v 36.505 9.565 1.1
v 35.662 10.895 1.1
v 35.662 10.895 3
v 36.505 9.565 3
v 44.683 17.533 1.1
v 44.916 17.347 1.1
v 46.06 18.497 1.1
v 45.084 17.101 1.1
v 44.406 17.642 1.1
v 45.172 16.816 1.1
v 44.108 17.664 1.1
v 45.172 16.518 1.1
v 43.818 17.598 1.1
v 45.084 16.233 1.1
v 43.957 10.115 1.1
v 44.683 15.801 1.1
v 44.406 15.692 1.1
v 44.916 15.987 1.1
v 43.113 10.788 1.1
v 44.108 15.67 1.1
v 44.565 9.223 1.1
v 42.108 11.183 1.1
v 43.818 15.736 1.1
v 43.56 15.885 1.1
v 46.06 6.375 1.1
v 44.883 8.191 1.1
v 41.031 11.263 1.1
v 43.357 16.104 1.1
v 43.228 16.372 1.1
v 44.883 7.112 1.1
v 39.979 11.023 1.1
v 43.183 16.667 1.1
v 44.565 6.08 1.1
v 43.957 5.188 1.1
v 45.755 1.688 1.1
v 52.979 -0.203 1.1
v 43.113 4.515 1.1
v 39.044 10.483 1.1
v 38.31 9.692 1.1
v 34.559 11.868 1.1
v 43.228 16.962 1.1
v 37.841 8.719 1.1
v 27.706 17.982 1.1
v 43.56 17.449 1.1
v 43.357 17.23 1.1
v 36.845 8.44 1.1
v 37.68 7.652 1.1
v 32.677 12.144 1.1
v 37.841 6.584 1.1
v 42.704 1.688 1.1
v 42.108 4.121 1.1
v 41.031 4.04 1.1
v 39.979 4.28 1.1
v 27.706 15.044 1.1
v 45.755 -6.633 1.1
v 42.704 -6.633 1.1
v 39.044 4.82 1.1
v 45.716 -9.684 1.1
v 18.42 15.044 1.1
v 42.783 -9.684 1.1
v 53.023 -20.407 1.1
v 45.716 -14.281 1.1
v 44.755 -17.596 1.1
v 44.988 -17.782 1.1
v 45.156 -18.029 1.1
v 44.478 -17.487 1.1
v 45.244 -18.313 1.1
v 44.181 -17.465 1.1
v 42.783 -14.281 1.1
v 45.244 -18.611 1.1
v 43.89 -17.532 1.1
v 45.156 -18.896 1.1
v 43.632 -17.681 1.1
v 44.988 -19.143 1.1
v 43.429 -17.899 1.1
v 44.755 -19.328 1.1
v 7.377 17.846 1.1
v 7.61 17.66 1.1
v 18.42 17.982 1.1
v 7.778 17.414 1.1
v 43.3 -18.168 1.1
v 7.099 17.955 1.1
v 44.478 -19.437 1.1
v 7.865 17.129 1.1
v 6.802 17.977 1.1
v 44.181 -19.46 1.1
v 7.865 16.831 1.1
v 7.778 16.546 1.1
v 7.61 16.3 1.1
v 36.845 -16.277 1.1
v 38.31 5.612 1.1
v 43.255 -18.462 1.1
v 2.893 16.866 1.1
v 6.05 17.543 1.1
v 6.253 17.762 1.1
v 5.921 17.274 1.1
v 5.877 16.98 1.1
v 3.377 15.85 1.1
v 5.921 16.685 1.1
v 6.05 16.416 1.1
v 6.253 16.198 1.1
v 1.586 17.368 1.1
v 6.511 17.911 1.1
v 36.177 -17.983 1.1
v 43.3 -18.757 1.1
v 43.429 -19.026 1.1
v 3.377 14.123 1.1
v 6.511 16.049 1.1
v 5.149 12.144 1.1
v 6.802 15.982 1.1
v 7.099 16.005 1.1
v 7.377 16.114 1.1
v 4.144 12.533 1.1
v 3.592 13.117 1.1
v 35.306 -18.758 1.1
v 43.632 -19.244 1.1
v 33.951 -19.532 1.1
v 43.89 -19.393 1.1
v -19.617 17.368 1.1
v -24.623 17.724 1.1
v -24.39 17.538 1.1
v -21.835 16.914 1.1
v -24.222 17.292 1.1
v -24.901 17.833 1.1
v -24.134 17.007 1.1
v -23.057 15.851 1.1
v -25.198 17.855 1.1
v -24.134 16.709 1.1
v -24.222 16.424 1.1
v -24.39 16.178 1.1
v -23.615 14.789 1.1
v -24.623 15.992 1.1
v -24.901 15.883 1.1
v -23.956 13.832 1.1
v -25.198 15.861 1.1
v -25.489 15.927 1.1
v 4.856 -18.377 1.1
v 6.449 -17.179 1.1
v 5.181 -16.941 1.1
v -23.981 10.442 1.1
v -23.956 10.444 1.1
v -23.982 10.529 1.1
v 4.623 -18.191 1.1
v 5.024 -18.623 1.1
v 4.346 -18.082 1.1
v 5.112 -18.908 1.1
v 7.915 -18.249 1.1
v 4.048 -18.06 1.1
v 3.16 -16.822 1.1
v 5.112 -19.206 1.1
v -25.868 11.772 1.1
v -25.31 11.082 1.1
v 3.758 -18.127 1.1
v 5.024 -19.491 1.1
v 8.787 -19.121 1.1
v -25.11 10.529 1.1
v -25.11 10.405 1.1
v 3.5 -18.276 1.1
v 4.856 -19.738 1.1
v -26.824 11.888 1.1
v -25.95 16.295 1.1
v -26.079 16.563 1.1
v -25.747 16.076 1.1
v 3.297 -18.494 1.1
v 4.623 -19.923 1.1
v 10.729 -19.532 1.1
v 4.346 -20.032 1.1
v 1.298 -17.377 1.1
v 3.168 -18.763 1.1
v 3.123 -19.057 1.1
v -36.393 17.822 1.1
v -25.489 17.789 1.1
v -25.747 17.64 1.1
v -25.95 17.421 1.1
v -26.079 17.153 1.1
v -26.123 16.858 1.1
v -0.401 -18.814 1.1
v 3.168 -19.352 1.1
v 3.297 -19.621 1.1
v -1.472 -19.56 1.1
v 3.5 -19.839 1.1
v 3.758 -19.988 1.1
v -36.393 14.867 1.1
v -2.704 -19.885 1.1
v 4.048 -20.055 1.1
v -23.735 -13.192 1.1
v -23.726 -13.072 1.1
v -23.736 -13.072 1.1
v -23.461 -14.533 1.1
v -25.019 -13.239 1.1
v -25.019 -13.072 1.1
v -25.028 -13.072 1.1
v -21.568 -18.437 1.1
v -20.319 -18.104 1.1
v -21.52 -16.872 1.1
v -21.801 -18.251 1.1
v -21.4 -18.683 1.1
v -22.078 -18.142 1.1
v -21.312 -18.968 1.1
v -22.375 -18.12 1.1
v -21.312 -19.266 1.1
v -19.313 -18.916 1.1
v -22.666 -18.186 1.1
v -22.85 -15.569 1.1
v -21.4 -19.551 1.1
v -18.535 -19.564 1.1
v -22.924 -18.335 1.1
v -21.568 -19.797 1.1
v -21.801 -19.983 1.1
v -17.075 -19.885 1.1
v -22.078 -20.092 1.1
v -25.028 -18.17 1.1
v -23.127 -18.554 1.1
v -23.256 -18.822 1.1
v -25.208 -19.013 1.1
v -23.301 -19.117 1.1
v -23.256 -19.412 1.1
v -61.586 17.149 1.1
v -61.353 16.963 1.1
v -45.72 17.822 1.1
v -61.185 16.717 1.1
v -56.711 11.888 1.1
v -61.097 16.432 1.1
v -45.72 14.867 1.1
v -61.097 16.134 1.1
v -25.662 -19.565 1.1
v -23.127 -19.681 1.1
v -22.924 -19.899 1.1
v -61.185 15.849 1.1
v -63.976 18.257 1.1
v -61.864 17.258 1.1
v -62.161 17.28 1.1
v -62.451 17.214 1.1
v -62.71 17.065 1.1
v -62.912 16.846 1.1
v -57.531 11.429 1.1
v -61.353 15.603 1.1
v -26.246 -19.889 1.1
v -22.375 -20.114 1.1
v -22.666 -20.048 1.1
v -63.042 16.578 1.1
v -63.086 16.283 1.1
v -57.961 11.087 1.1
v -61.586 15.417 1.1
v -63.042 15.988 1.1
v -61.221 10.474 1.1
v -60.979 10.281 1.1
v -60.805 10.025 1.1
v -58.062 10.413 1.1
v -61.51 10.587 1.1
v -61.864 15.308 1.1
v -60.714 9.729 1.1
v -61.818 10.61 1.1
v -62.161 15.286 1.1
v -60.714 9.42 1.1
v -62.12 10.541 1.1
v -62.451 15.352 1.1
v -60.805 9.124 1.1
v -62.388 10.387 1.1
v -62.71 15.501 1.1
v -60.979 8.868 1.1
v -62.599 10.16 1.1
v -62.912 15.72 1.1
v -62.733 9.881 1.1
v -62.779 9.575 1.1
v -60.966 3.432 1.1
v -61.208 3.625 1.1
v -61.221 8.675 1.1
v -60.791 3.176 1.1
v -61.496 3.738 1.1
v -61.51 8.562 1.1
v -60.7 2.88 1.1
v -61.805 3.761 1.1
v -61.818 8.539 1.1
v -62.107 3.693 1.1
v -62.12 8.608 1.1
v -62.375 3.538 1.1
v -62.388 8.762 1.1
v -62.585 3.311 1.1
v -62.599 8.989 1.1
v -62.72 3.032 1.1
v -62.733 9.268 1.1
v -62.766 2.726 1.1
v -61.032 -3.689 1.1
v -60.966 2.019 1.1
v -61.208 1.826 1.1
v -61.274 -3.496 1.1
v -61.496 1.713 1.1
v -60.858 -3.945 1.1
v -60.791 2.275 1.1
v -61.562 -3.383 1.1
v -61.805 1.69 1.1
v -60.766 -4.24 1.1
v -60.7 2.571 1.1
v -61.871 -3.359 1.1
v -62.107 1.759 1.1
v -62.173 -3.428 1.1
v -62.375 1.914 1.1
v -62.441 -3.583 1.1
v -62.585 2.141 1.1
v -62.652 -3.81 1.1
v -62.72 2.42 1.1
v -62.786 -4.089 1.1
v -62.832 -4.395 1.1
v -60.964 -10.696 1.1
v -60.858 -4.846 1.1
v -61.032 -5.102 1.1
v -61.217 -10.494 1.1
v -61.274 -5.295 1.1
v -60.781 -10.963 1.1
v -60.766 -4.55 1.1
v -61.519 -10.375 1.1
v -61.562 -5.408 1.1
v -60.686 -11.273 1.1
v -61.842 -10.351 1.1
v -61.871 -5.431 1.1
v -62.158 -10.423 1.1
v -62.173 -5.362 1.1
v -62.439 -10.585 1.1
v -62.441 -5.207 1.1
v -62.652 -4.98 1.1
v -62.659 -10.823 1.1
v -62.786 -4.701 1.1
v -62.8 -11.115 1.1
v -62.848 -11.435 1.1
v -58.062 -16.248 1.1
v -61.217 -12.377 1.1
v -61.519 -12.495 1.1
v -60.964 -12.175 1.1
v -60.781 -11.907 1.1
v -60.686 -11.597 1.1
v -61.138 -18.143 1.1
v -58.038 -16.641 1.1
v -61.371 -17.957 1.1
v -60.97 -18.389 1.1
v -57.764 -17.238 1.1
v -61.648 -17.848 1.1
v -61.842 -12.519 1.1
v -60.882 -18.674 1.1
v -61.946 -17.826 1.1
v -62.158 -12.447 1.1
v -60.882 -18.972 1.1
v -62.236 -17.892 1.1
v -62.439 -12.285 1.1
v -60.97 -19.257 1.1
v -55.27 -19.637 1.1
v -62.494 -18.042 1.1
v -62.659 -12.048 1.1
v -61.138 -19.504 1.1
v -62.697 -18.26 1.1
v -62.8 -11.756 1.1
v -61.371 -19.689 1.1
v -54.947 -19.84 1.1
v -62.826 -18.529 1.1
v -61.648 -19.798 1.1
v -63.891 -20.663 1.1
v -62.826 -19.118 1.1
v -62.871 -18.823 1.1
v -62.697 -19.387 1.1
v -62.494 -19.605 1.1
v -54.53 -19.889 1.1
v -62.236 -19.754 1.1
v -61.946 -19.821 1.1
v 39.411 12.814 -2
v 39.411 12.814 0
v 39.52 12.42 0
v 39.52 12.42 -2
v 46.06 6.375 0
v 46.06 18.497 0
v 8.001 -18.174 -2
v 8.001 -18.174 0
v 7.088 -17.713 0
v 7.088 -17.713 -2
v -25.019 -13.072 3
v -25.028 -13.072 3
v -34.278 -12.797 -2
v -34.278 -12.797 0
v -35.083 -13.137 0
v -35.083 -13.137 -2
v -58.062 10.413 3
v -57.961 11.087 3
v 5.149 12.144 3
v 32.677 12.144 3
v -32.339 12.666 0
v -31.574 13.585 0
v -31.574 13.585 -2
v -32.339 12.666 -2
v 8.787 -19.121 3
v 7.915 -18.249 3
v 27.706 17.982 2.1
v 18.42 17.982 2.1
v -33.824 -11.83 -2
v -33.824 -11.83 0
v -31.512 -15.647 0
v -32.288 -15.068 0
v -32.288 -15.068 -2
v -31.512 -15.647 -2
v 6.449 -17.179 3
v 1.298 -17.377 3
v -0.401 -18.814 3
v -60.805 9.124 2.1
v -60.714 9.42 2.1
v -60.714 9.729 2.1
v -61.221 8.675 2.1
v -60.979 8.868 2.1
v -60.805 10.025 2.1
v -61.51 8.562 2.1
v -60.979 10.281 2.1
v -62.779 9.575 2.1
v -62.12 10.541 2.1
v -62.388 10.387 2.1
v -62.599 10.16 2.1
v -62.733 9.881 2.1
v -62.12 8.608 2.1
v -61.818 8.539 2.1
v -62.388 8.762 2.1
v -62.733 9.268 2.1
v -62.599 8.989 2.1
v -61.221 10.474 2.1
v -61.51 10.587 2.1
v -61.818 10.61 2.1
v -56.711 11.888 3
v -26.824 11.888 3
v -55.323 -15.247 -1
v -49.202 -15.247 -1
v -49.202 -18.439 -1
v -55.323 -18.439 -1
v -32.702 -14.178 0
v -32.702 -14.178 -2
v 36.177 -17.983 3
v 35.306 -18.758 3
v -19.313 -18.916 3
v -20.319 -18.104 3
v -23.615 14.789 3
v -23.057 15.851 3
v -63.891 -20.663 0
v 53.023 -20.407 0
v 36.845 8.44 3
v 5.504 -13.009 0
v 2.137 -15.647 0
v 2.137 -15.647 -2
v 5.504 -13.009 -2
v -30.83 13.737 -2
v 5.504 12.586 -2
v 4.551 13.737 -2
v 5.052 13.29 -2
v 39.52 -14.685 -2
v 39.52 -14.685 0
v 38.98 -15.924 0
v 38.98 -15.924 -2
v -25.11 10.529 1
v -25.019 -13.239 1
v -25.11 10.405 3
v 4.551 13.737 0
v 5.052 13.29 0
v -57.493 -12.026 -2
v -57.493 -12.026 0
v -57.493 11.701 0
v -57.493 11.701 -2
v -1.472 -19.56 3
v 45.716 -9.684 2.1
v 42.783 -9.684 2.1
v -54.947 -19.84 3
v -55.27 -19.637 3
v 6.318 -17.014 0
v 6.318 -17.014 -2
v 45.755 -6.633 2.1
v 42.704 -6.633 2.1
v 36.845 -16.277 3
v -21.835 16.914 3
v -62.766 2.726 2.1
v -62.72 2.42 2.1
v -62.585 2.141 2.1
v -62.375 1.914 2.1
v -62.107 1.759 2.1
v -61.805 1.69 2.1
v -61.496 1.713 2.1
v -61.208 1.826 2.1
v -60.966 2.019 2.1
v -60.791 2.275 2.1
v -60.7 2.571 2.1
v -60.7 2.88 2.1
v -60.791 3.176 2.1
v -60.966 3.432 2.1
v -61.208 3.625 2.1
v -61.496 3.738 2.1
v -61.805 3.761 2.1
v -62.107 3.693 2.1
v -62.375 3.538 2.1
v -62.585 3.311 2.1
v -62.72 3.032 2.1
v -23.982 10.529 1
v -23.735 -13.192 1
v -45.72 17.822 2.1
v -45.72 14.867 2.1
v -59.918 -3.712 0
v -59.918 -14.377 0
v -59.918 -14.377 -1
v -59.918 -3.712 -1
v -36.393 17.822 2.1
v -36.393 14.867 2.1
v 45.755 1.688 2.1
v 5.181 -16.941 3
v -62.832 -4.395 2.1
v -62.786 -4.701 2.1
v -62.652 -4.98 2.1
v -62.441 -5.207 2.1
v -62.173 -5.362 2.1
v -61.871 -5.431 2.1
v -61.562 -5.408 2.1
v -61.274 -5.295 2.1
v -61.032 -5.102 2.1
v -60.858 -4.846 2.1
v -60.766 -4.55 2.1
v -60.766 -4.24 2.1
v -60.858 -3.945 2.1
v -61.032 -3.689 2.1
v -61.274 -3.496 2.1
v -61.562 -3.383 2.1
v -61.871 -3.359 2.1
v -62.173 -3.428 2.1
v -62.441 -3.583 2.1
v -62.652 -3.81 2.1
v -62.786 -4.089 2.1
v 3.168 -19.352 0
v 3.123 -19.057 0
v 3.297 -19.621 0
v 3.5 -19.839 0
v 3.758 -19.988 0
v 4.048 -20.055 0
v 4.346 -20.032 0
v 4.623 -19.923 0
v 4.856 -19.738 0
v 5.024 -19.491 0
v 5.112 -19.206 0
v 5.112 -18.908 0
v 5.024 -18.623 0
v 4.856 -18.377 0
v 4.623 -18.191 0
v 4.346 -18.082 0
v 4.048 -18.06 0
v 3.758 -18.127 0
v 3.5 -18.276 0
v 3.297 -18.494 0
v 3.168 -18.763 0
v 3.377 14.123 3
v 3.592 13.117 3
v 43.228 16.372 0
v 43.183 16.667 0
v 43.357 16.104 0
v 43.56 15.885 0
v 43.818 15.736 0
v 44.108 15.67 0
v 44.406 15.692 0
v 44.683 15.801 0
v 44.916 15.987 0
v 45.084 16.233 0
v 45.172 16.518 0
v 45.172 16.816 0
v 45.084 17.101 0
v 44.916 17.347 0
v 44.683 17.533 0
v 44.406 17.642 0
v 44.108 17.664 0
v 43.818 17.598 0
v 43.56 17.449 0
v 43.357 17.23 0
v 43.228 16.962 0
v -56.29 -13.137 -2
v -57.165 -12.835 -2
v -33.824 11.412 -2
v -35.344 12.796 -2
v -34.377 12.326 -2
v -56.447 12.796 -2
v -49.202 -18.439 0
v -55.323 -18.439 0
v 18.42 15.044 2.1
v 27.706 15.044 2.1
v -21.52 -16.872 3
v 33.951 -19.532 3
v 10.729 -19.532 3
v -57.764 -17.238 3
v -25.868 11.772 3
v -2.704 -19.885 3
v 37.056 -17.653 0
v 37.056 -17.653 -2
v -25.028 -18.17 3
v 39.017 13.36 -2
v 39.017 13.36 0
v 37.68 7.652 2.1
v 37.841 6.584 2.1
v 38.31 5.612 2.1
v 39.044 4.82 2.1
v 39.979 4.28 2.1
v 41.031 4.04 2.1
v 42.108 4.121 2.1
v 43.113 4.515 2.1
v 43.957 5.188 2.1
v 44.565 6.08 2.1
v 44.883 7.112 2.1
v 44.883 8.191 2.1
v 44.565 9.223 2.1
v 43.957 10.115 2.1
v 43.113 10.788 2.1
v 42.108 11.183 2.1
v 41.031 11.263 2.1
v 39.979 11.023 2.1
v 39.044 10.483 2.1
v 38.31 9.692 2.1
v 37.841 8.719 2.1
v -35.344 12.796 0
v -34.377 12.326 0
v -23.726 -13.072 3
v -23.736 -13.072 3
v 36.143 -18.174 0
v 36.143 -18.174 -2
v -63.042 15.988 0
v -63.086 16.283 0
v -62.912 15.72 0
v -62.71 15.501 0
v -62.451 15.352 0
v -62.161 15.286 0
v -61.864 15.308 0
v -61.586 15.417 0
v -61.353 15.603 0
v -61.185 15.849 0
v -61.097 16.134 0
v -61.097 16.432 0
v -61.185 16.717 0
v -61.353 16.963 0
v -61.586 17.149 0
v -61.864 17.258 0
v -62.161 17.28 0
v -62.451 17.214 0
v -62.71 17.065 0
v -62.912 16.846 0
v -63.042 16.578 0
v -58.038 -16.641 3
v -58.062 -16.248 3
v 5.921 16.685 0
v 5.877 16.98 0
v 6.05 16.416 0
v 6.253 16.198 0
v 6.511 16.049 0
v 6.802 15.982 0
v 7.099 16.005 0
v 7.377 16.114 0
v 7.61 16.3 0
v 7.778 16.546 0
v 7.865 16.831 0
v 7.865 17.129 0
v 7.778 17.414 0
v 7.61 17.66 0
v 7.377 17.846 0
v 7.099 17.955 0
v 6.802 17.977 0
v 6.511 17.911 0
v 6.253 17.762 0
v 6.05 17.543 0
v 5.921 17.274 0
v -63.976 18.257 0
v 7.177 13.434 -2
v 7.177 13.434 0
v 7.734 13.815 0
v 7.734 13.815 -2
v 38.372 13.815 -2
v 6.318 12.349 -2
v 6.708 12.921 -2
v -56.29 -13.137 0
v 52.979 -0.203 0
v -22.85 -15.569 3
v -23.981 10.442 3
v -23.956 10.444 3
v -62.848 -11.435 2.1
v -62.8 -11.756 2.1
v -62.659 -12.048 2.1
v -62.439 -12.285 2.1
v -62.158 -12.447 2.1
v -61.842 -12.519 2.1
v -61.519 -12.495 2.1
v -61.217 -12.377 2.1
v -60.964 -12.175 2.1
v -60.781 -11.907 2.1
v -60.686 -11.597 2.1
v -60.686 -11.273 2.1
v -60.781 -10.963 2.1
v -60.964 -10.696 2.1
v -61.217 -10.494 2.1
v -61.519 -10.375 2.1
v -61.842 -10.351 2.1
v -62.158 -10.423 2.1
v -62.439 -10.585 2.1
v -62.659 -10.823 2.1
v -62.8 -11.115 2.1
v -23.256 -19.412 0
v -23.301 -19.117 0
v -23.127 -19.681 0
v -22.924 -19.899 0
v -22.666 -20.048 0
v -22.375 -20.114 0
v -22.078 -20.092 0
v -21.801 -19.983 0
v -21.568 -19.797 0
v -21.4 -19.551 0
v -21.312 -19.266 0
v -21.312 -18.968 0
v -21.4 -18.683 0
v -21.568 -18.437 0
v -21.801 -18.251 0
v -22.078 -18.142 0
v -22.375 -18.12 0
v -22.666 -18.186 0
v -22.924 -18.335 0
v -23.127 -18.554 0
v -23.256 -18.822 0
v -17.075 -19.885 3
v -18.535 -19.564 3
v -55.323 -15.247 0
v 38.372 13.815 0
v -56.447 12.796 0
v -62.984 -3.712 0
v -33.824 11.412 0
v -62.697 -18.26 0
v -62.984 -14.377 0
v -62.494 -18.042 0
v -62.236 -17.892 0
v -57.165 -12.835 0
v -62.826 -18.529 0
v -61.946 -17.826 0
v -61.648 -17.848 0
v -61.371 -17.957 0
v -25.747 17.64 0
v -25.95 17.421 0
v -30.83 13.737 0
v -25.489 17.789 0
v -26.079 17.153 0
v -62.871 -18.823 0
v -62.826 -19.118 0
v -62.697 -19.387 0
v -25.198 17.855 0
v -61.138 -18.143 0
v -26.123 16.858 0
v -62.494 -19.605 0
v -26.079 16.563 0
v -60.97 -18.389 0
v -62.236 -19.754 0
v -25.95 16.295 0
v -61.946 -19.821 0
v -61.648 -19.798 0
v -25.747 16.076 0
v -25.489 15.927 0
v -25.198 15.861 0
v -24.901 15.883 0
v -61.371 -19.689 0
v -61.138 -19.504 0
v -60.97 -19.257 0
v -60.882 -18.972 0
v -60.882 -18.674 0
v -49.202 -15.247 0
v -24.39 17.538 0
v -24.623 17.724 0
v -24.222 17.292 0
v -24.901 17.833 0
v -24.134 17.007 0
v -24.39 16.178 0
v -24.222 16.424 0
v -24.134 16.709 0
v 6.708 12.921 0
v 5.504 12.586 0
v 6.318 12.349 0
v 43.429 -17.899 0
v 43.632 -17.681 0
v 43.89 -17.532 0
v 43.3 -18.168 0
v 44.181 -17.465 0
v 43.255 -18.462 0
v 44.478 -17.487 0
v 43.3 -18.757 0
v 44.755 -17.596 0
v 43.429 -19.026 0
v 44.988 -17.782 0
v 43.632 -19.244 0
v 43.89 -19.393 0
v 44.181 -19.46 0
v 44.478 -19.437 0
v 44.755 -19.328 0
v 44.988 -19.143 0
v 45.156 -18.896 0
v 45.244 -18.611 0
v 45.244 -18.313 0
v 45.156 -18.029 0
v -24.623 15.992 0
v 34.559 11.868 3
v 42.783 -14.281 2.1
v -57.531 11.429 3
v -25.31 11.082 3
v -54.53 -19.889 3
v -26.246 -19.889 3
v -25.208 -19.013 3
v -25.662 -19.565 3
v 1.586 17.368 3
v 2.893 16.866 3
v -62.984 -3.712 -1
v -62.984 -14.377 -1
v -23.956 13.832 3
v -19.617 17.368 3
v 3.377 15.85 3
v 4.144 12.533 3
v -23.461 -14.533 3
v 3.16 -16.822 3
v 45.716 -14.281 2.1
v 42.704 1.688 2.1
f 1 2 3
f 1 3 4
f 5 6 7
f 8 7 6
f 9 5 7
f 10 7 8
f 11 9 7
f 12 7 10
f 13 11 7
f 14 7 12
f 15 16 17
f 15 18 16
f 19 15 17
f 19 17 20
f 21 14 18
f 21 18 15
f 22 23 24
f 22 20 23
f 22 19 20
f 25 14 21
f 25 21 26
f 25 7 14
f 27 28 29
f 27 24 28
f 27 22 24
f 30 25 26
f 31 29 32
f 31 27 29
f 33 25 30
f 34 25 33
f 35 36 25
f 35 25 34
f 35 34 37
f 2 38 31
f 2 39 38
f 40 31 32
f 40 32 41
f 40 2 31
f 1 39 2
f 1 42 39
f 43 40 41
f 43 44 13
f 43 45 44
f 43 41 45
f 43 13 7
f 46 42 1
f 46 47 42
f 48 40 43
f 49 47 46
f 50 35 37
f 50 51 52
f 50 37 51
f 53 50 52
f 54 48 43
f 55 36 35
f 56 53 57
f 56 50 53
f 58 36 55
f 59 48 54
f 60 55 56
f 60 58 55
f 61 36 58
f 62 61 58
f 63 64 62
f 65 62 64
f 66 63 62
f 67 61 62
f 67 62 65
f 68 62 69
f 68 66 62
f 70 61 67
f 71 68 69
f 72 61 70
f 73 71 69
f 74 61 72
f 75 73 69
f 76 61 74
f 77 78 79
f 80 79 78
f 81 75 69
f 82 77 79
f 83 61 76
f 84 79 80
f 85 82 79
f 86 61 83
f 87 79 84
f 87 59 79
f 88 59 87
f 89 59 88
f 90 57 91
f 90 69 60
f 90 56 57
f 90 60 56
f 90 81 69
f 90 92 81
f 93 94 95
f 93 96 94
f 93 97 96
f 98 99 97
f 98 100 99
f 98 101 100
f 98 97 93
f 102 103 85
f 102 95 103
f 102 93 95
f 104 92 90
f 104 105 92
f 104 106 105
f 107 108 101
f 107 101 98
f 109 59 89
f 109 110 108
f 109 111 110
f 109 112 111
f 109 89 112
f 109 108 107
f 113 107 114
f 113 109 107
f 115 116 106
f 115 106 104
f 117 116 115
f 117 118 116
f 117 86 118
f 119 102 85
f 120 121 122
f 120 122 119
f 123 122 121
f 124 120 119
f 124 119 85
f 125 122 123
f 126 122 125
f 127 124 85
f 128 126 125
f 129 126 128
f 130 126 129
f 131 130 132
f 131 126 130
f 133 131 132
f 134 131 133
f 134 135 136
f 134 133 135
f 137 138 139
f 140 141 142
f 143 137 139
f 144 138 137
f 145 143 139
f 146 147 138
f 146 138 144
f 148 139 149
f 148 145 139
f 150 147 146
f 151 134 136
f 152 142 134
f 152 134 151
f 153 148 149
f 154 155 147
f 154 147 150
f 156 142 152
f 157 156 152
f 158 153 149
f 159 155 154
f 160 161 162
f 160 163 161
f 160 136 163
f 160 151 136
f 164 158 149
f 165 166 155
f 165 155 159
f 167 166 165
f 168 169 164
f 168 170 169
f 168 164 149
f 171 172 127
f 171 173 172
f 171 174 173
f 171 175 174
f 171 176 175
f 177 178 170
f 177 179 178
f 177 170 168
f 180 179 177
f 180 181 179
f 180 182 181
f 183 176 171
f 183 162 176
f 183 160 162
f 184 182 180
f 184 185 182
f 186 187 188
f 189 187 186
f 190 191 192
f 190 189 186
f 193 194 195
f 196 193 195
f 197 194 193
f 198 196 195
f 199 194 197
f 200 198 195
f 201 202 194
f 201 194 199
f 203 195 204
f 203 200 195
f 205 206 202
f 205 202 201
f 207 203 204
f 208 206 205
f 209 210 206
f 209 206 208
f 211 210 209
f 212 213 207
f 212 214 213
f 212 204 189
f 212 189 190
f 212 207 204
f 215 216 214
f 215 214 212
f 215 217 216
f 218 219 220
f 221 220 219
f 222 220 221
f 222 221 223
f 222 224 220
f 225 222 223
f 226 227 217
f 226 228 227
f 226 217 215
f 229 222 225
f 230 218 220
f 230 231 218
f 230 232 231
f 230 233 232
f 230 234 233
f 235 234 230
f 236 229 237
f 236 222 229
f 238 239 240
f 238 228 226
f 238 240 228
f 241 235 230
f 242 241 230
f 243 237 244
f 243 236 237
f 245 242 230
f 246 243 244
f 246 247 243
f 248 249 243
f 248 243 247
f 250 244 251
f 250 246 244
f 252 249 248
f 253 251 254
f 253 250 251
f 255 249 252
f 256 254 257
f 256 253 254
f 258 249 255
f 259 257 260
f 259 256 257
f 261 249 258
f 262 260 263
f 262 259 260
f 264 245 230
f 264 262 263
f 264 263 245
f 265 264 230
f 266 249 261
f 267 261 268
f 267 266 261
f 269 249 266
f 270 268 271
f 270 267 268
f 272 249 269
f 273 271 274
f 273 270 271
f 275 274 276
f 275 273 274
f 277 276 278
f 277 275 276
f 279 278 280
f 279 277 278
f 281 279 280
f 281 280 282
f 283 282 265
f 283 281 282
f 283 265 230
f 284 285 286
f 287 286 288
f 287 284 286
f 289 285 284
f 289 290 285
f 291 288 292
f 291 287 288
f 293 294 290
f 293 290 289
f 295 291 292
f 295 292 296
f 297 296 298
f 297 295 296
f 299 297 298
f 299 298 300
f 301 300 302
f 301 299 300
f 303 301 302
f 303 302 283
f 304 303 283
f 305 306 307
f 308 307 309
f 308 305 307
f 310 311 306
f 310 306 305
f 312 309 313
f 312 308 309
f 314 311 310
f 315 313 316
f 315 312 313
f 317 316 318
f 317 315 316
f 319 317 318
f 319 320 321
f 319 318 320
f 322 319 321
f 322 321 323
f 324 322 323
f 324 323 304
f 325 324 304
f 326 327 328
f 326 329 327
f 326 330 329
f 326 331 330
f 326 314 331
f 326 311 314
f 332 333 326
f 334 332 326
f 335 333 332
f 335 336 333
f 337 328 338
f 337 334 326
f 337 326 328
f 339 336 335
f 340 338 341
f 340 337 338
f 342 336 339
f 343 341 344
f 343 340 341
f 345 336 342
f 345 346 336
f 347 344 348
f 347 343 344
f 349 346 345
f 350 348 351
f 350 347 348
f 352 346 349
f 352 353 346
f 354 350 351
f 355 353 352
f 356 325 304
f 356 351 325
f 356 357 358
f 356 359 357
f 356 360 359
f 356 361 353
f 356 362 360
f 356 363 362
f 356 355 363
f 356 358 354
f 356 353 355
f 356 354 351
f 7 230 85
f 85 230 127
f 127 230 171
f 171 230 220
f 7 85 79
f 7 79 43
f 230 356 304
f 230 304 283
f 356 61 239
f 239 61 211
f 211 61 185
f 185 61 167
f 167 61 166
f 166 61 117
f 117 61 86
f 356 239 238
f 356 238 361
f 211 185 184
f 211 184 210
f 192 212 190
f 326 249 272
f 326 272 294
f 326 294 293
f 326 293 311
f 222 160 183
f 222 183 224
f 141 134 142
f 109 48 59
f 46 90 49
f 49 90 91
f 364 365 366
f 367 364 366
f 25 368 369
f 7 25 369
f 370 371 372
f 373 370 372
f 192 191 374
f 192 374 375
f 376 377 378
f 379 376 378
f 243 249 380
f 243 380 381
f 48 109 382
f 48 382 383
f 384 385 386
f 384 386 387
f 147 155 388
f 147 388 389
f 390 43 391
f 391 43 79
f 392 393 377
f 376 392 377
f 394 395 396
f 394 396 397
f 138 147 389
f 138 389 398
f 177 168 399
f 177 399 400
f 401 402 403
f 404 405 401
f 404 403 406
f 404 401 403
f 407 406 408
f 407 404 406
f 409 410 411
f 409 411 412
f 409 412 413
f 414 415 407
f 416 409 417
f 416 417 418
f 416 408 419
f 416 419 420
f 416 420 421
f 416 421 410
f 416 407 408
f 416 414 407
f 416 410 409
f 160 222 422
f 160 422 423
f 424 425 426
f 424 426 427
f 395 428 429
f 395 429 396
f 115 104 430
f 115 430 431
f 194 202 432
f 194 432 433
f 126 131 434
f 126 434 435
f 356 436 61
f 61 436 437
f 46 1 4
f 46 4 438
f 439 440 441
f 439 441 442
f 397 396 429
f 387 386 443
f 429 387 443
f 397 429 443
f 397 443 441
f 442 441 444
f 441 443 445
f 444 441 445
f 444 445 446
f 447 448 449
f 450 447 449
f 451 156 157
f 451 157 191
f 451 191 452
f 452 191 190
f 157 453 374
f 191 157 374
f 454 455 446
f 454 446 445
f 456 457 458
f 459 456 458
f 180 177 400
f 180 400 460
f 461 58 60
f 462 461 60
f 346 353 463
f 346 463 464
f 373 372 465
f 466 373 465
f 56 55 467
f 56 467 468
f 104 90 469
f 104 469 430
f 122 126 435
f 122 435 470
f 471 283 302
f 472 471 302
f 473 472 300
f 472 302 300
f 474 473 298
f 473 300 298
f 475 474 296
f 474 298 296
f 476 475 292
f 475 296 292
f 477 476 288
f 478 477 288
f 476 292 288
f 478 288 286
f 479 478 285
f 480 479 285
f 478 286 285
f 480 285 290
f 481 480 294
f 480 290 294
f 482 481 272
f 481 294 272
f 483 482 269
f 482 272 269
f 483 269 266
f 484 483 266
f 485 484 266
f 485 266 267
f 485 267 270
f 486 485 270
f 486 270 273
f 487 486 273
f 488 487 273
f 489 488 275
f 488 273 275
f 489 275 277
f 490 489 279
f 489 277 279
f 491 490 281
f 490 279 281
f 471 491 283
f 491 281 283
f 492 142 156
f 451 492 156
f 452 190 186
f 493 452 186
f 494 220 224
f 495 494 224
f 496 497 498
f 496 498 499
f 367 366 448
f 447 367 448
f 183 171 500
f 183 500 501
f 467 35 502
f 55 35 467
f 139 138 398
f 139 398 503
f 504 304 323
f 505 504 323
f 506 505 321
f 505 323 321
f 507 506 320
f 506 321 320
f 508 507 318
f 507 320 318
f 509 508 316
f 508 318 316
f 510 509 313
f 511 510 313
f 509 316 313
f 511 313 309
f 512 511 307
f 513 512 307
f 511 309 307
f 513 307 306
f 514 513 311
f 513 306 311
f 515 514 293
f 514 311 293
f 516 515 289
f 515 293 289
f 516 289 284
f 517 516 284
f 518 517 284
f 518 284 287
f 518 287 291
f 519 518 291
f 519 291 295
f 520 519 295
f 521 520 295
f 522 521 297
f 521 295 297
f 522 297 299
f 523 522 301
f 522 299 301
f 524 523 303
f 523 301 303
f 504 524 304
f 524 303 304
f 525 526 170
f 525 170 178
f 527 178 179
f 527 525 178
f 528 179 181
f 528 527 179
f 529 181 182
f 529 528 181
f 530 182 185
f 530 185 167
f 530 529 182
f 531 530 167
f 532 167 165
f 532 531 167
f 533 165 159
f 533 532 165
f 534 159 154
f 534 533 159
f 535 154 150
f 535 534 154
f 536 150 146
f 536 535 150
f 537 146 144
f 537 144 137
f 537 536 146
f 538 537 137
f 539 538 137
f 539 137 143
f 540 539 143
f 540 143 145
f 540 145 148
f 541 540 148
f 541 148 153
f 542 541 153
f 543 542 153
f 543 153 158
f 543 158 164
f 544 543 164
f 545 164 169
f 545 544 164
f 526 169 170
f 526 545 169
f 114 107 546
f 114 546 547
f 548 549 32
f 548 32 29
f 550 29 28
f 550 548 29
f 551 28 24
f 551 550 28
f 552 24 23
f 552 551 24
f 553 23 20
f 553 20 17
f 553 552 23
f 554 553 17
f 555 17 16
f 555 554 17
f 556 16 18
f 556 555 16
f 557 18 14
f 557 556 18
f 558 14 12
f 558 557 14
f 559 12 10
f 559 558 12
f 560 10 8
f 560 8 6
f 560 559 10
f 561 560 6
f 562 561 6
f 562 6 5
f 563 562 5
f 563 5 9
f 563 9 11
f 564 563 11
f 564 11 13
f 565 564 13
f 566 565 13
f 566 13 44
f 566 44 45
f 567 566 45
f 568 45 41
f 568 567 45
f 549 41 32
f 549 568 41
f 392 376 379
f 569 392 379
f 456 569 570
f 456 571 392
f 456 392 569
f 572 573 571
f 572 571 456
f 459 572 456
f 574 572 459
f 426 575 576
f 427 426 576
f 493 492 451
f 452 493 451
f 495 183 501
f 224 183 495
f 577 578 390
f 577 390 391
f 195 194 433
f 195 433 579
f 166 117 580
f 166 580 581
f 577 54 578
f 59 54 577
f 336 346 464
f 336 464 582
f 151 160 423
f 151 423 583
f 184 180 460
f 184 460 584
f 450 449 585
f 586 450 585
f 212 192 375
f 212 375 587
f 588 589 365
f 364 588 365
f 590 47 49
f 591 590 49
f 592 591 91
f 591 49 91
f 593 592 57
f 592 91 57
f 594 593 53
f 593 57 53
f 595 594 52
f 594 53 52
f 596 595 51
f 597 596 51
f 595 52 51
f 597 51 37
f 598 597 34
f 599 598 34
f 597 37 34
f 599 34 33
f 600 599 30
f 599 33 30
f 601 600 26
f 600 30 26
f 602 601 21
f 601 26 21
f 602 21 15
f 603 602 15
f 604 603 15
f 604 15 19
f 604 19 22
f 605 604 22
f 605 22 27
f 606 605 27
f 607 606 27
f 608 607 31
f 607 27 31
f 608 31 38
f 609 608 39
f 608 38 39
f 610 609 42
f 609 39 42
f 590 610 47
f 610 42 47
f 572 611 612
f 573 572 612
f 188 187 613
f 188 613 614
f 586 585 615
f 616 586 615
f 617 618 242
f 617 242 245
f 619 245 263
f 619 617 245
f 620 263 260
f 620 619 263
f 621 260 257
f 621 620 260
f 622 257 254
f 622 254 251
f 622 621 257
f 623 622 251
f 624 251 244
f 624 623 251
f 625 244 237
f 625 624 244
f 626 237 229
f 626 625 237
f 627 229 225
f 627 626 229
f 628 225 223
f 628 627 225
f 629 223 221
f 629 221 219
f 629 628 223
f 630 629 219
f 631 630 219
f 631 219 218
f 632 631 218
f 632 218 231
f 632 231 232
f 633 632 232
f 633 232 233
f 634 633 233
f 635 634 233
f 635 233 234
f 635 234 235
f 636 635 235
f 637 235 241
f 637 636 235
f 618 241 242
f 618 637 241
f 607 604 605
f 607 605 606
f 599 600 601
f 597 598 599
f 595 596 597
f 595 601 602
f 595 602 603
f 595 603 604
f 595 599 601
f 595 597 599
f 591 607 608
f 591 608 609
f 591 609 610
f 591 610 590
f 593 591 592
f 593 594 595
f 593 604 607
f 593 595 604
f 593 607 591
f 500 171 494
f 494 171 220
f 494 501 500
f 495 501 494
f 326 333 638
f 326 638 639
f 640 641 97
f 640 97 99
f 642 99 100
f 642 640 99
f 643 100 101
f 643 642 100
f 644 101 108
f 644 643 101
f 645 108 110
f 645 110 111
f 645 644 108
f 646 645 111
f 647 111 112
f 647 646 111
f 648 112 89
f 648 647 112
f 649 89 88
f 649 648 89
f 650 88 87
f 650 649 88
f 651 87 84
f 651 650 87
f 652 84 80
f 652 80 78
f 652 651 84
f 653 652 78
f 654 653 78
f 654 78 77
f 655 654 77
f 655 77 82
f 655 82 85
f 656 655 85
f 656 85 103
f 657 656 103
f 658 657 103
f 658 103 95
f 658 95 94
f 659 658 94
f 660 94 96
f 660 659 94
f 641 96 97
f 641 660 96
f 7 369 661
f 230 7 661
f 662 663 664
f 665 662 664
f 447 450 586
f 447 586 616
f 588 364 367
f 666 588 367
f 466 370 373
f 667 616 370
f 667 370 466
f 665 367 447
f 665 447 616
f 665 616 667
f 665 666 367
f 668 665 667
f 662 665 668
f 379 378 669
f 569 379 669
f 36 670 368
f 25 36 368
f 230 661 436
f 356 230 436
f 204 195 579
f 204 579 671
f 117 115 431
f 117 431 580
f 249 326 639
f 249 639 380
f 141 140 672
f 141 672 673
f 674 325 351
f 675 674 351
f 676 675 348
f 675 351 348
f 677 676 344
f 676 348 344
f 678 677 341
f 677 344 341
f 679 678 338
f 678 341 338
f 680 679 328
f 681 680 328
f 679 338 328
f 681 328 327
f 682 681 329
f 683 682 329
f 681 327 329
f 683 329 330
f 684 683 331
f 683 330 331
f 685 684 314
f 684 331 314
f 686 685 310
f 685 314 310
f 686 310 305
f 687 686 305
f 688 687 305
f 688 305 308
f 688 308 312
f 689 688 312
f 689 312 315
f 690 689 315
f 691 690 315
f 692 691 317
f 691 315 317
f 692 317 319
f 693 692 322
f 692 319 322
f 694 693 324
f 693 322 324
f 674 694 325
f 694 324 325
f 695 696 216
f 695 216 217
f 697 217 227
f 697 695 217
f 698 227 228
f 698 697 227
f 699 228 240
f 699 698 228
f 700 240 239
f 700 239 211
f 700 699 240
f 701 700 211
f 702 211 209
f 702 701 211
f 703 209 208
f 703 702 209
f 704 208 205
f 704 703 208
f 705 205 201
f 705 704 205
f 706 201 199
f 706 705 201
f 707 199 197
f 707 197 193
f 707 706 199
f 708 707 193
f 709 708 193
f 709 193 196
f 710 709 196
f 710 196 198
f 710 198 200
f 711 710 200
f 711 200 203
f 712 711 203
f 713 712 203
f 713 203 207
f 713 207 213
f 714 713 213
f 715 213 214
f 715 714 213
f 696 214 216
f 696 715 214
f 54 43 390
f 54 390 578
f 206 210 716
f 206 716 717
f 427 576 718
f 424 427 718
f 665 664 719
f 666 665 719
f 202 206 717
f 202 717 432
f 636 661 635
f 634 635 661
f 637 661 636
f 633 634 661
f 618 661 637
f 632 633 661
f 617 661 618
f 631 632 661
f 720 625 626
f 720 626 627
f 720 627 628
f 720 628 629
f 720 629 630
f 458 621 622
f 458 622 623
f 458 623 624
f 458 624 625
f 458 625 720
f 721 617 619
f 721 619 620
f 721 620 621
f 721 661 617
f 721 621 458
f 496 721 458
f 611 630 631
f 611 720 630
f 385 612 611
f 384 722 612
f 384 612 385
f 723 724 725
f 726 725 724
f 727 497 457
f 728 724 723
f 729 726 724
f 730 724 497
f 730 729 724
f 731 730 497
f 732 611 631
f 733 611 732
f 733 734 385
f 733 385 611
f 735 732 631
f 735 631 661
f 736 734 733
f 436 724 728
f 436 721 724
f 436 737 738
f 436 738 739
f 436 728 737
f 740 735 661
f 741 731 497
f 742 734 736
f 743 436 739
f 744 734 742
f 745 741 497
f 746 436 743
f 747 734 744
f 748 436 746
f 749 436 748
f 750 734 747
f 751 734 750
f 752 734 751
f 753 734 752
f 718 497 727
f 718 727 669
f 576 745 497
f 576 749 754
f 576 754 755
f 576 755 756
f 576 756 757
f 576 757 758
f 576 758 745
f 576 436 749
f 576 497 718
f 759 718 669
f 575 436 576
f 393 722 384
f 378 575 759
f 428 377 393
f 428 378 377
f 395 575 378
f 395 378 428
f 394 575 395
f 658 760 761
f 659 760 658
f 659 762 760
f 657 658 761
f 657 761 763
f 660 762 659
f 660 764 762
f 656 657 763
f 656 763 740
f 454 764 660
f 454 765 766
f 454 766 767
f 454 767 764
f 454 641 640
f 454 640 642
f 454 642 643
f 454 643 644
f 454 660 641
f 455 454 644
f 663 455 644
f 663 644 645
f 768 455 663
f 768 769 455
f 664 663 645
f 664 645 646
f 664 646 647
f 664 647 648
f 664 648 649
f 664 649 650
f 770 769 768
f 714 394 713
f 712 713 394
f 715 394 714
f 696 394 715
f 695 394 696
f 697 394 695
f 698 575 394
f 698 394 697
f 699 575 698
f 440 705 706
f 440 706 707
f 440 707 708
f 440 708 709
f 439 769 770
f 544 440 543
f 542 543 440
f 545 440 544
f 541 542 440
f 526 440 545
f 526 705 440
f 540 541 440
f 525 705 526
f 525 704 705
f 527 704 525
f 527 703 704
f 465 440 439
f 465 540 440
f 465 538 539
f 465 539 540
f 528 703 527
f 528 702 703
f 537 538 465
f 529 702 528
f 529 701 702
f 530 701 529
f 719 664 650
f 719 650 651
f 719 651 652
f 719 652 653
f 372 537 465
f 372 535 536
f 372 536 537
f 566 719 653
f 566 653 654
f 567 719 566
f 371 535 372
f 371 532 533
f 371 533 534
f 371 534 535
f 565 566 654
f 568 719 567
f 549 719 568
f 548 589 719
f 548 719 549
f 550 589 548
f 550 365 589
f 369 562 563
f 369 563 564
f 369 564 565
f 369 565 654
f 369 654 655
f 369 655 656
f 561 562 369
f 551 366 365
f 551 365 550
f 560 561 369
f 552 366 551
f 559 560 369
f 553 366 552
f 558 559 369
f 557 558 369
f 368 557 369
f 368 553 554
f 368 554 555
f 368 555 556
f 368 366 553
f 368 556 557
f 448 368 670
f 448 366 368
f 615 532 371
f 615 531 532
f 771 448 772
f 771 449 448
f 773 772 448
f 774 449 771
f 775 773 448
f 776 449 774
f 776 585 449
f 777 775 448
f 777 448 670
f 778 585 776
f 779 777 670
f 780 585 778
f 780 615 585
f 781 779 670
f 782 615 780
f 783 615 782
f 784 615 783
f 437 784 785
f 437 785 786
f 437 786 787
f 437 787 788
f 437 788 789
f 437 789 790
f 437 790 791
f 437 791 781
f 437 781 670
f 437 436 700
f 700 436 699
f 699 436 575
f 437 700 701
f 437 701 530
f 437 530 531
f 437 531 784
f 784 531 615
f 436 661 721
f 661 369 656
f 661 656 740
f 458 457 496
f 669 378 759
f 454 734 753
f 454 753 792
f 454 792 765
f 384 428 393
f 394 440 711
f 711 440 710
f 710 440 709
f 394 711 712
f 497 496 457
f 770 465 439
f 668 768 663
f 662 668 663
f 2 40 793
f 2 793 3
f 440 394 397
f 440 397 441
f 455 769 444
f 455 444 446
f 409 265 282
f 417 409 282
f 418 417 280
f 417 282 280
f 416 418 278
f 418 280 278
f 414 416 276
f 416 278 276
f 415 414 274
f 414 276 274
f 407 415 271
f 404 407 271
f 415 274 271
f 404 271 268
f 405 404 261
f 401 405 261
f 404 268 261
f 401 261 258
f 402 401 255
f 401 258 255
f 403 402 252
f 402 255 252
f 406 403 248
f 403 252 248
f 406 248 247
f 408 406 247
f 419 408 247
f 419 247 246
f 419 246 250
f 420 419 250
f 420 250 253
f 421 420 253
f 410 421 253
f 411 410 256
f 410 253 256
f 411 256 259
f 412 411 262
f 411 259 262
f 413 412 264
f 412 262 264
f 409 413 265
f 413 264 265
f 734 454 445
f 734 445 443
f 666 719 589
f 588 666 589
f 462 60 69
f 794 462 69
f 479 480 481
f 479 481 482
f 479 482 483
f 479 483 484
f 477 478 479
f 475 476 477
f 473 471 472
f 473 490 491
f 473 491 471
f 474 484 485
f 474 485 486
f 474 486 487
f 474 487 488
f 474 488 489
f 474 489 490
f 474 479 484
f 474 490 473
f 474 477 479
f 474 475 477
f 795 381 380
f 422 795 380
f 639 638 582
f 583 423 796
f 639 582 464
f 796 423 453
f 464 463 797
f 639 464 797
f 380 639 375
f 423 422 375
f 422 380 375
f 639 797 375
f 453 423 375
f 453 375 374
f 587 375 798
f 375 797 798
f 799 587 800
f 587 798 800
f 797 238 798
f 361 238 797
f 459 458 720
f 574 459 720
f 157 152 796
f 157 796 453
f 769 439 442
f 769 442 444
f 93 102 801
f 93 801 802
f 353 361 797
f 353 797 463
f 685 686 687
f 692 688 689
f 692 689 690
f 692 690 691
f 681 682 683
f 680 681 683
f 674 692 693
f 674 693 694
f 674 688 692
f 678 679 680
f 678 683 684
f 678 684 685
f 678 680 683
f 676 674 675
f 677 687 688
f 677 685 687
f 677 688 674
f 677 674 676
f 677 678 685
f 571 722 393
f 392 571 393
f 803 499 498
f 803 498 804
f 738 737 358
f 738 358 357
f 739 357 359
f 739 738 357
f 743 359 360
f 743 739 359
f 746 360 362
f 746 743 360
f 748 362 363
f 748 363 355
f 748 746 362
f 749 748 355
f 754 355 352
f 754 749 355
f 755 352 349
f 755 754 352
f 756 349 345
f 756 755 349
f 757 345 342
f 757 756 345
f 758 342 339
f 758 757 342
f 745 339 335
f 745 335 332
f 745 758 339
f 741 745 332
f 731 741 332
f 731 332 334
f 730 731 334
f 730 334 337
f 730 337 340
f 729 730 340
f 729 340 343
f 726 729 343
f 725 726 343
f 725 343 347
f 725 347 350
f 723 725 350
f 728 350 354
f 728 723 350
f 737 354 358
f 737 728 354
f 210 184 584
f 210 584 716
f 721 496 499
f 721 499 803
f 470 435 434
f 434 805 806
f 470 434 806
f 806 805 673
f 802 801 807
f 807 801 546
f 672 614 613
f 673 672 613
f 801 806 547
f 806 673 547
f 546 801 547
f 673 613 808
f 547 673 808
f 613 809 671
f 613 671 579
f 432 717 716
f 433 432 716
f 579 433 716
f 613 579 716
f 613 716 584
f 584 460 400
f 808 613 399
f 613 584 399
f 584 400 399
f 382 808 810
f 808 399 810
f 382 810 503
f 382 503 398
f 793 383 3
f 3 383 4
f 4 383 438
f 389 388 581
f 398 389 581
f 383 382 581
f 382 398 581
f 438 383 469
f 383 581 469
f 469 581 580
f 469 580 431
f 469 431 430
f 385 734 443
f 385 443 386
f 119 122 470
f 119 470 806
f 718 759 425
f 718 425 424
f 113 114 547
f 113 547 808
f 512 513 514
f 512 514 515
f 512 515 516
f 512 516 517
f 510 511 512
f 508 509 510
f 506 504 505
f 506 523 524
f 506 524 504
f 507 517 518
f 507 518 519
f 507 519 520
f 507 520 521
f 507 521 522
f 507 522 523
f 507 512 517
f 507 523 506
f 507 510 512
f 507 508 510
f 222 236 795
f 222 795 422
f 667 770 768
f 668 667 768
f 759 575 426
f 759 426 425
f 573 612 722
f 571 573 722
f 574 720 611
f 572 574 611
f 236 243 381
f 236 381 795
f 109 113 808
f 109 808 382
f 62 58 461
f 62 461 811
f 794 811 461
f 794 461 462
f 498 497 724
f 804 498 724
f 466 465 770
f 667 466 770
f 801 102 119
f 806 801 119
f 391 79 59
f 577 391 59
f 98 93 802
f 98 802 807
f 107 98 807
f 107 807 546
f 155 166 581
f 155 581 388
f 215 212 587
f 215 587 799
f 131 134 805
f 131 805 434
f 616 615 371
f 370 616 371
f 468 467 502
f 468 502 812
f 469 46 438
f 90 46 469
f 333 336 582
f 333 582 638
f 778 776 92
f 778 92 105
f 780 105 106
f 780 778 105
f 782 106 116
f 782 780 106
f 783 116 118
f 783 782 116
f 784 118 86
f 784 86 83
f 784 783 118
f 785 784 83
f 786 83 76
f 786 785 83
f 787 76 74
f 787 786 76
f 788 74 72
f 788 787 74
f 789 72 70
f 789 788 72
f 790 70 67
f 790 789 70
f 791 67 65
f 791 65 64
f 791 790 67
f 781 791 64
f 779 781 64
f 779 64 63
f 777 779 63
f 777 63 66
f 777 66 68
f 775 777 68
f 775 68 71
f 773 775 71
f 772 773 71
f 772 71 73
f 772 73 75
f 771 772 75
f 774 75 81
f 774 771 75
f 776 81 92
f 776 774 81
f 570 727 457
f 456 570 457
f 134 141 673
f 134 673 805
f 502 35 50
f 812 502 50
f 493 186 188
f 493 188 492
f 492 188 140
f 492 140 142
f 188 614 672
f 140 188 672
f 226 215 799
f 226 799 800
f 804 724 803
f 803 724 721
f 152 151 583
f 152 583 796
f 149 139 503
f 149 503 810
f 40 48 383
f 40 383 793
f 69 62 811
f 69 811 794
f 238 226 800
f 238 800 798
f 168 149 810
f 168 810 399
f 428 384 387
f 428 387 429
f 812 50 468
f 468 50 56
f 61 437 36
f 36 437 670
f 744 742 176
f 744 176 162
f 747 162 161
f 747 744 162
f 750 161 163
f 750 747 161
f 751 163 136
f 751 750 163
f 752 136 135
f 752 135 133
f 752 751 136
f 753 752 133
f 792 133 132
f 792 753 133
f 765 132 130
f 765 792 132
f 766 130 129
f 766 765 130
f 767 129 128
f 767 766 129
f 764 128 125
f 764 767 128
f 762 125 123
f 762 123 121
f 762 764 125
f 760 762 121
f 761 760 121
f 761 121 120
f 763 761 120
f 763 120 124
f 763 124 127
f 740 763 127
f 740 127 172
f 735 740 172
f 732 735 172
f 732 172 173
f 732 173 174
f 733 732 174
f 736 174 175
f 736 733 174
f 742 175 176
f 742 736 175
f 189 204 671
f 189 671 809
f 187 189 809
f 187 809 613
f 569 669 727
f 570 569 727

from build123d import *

# Parameters (mm, degrees)
SKETCH_R             = 1.000002
PAD_DEPTH            = 1.1
PAD001_DEPTH         = 3
SKETCH002_R          = 3.621622
SKETCH002_R_2        = 1.0871950633
SKETCH002_R_3        = 1.038663
SKETCH002_W          = 2.932263
SKETCH002_H          = 4.596517
SKETCH002_W_2        = 3.05114
SKETCH002_H_2        = 8.32128
SKETCH002_W_3        = 9.285799
SKETCH002_H_3        = 2.937828
SKETCH002_W_4        = 9.327248
SKETCH002_H_4        = 2.955594
PAD002_DEPTH         = 1
POCKET_DEPTH         = 2
PAD003_DEPTH         = 2
SKETCH005_W          = 3.065838
SKETCH005_H          = 10.665194
SKETCH005_W_2        = 6.121548
SKETCH005_H_2        = 3.191952
PAD004_DEPTH         = 1
BODY_PLACEMENT_ANGLE = 180


with BuildPart() as part:
    # Sketch → Pad (new body)
    with BuildSketch(Plane.XY):
        Polygon((-53.022964, 20.407351), (-52.9787547167, 0.2027583732), (-46.0602256559, -6.375196), (-46.0602256559, -18.4974481912), (63.976062776, -18.2566798895), (63.890903, 20.663168), align=None)
        with Locations((-44.255245, 18.462399)):
            Circle(SKETCH_R, mode=Mode.SUBTRACT)
        with Locations((61.870895, 18.823345)):
            Circle(SKETCH_R, mode=Mode.SUBTRACT)
        with Locations((62.086082, -16.283087)):
            Circle(SKETCH_R, mode=Mode.SUBTRACT)
        with Locations((25.123287, -16.858114)):
            Circle(SKETCH_R, mode=Mode.SUBTRACT)
        with Locations((-6.876536, -16.979681)):
            Circle(SKETCH_R, mode=Mode.SUBTRACT)
        with Locations((-44.183197, -16.667006)):
            Circle(SKETCH_R, mode=Mode.SUBTRACT)
        with Locations((-4.123168, 19.057377)):
            Circle(SKETCH_R, mode=Mode.SUBTRACT)
        with Locations((22.300682, 19.11718)):
            Circle(SKETCH_R, mode=Mode.SUBTRACT)
    extrude(amount=PAD_DEPTH)

    # Sketch001 → Pad001 (join)
    with BuildSketch(Plane.XY):
        Polygon((-36.844624, 16.276525), (-36.177216, 17.983372), (-35.306049, 18.757744), (-33.950901, 19.532116), (-10.728604, 19.532116), (-8.786971, 19.120708), (-7.915218, 18.248957), (-6.449088, 17.179077), (-5.181084, 16.941326), (-3.160203, 16.822451), (-1.297821, 17.377203), (0.401002, 18.814226), (1.471598, 19.5604), (2.704406, 19.884823), (17.074905, 19.884823), (18.534807, 19.564352), (19.313425, 18.915506), (20.319134, 18.104448), (21.519503, 16.871641), (22.849751, 15.56896), (23.460667, 14.53306), (23.726282, 13.072177), (25.027796, 13.072177), (25.027796, 18.169937), (25.208204, 19.013437), (25.662395, 19.564959), (26.246357, 19.889381), (54.529621, 19.889381), (54.947342, 19.840021), (55.269585, 19.637127), (57.763969, 17.23822), (58.038471, 16.641476), (58.06234, 16.247625), (58.06234, -10.412685), (57.961418, -11.086915), (57.531475, -11.428915), (56.710674, -11.888173), (26.824308, -11.888173), (25.868092, -11.772225), (25.310301, -11.081625), (25.097807, -10.364464), (23.955662, -10.444148), (23.955662, -13.832493), (23.614752, -14.78871), (23.056957, -15.851171), (21.835127, -16.913633), (19.616846, -17.367628), (16.833258, -17.367628), (4.714081, -17.367628), (-1.58584, -17.367628), (-2.892593, -16.866425), (-3.376577, -15.850059), (-3.376577, -14.122653), (-3.592077, -13.11694), (-4.143597, -12.532976), (-5.149311, -12.143668), (-32.677246, -12.143668), (-34.558903, -11.868008), (-35.661945, -10.894736), (-36.505447, -9.564599), (-36.844624, -8.440372), align=None)
    extrude(amount=PAD001_DEPTH)

    # Sketch002 (on Face5 of Pad001) → Pad002 (join)
    with BuildSketch(Plane.XY.offset(1.1)):
        with Locations((-41.301872, -7.651712)):
            Circle(SKETCH002_R)
        with Locations((61.760948, 11.435151)):
            Circle(SKETCH002_R_2)
        with Locations((61.793392, 4.39516)):
            Circle(SKETCH002_R_3)
        with Locations((61.727276, -2.725665)):
            Circle(SKETCH002_R_3)
        with Locations((61.740788, -9.574547)):
            Circle(SKETCH002_R_3)
        with Locations((-44.2495595, 11.9823365)):
            Rectangle(SKETCH002_W, SKETCH002_H)
        with Locations((-44.229748, 2.4723)):
            Rectangle(SKETCH002_W_2, SKETCH002_H_2)
        with Locations((-23.0629585, -16.513226)):
            Rectangle(SKETCH002_W_3, SKETCH002_H_3)
        with Locations((41.056557, -16.344444)):
            Rectangle(SKETCH002_W_4, SKETCH002_H_4)
    extrude(amount=PAD002_DEPTH)

    # Sketch003 (on Face107 of Pad002) → Pocket (cut)
    with BuildSketch(Plane.XY.offset(3)):
        Polygon((23.735168, 13.191908), (23.982185, -10.528876), (25.110214, -10.528876), (25.018686, 13.238607), align=None)
    extrude(amount=-POCKET_DEPTH, mode=Mode.SUBTRACT)

    # Sketch004 (on Face4 of Pocket) → Pad003 (join)
    with BuildSketch(Plane(origin=(0, 0, 0), x_dir=(1, 0, 0), z_dir=(0, 0, -1))):
        Polygon((-38.371834, 13.814776), (-39.017166, 13.360193), (-39.410694, 12.813627), (-39.520008, 12.4201), (-39.520008, -14.684528), (-38.980286, -15.923907), (-37.055988, -17.652515), (-36.142761, -18.174358), (-8.000727, -18.174358), (-7.087676, -17.71302), (-6.318431, -17.014458), (-6.318431, 12.349279), (-6.707822, 12.920823), (-7.176782, 13.433747), (-7.733671, 13.814776), align=None)
        Polygon((-5.504074, 12.586247), (-5.05245, 13.289701), (-4.55126, 13.737192), (30.83049, 13.737192), (31.573822, 13.584511), (32.339016, 12.666278), (32.701897, -14.178478), (32.288383, -15.067693), (31.512323, -15.647282), (-2.137218, -15.647282), (-5.504074, -13.009031), align=None)
        Polygon((33.824478, -11.830342), (34.277905, -12.79659), (35.083393, -13.136684), (56.290169, -13.136684), (57.16468, -12.83504), (57.492619, -12.026119), (57.492619, 11.701175), (56.447365, 12.796005), (35.343506, 12.796005), (34.37656, 12.325871), (33.824478, 11.411518), align=None)
    extrude(amount=PAD003_DEPTH)

    # Sketch005 (on Face4 of Pad003) → Pad004 (join)
    with BuildSketch(Plane(origin=(0, 0, 0), x_dir=(1, 0, 0), z_dir=(0, 0, -1))):
        with Locations((61.451113, -9.044624)):
            Rectangle(SKETCH005_W, SKETCH005_H)
        with Locations((52.262358, -16.842775)):
            Rectangle(SKETCH005_W_2, SKETCH005_H_2)
    extrude(amount=PAD004_DEPTH)


with BuildPart() as part_1:
    # Body placement: moved
    add(part.part.rotate(Axis((0, 0, 0), (0, 0, 1)), BODY_PLACEMENT_ANGLE))


solid = part_1.part
